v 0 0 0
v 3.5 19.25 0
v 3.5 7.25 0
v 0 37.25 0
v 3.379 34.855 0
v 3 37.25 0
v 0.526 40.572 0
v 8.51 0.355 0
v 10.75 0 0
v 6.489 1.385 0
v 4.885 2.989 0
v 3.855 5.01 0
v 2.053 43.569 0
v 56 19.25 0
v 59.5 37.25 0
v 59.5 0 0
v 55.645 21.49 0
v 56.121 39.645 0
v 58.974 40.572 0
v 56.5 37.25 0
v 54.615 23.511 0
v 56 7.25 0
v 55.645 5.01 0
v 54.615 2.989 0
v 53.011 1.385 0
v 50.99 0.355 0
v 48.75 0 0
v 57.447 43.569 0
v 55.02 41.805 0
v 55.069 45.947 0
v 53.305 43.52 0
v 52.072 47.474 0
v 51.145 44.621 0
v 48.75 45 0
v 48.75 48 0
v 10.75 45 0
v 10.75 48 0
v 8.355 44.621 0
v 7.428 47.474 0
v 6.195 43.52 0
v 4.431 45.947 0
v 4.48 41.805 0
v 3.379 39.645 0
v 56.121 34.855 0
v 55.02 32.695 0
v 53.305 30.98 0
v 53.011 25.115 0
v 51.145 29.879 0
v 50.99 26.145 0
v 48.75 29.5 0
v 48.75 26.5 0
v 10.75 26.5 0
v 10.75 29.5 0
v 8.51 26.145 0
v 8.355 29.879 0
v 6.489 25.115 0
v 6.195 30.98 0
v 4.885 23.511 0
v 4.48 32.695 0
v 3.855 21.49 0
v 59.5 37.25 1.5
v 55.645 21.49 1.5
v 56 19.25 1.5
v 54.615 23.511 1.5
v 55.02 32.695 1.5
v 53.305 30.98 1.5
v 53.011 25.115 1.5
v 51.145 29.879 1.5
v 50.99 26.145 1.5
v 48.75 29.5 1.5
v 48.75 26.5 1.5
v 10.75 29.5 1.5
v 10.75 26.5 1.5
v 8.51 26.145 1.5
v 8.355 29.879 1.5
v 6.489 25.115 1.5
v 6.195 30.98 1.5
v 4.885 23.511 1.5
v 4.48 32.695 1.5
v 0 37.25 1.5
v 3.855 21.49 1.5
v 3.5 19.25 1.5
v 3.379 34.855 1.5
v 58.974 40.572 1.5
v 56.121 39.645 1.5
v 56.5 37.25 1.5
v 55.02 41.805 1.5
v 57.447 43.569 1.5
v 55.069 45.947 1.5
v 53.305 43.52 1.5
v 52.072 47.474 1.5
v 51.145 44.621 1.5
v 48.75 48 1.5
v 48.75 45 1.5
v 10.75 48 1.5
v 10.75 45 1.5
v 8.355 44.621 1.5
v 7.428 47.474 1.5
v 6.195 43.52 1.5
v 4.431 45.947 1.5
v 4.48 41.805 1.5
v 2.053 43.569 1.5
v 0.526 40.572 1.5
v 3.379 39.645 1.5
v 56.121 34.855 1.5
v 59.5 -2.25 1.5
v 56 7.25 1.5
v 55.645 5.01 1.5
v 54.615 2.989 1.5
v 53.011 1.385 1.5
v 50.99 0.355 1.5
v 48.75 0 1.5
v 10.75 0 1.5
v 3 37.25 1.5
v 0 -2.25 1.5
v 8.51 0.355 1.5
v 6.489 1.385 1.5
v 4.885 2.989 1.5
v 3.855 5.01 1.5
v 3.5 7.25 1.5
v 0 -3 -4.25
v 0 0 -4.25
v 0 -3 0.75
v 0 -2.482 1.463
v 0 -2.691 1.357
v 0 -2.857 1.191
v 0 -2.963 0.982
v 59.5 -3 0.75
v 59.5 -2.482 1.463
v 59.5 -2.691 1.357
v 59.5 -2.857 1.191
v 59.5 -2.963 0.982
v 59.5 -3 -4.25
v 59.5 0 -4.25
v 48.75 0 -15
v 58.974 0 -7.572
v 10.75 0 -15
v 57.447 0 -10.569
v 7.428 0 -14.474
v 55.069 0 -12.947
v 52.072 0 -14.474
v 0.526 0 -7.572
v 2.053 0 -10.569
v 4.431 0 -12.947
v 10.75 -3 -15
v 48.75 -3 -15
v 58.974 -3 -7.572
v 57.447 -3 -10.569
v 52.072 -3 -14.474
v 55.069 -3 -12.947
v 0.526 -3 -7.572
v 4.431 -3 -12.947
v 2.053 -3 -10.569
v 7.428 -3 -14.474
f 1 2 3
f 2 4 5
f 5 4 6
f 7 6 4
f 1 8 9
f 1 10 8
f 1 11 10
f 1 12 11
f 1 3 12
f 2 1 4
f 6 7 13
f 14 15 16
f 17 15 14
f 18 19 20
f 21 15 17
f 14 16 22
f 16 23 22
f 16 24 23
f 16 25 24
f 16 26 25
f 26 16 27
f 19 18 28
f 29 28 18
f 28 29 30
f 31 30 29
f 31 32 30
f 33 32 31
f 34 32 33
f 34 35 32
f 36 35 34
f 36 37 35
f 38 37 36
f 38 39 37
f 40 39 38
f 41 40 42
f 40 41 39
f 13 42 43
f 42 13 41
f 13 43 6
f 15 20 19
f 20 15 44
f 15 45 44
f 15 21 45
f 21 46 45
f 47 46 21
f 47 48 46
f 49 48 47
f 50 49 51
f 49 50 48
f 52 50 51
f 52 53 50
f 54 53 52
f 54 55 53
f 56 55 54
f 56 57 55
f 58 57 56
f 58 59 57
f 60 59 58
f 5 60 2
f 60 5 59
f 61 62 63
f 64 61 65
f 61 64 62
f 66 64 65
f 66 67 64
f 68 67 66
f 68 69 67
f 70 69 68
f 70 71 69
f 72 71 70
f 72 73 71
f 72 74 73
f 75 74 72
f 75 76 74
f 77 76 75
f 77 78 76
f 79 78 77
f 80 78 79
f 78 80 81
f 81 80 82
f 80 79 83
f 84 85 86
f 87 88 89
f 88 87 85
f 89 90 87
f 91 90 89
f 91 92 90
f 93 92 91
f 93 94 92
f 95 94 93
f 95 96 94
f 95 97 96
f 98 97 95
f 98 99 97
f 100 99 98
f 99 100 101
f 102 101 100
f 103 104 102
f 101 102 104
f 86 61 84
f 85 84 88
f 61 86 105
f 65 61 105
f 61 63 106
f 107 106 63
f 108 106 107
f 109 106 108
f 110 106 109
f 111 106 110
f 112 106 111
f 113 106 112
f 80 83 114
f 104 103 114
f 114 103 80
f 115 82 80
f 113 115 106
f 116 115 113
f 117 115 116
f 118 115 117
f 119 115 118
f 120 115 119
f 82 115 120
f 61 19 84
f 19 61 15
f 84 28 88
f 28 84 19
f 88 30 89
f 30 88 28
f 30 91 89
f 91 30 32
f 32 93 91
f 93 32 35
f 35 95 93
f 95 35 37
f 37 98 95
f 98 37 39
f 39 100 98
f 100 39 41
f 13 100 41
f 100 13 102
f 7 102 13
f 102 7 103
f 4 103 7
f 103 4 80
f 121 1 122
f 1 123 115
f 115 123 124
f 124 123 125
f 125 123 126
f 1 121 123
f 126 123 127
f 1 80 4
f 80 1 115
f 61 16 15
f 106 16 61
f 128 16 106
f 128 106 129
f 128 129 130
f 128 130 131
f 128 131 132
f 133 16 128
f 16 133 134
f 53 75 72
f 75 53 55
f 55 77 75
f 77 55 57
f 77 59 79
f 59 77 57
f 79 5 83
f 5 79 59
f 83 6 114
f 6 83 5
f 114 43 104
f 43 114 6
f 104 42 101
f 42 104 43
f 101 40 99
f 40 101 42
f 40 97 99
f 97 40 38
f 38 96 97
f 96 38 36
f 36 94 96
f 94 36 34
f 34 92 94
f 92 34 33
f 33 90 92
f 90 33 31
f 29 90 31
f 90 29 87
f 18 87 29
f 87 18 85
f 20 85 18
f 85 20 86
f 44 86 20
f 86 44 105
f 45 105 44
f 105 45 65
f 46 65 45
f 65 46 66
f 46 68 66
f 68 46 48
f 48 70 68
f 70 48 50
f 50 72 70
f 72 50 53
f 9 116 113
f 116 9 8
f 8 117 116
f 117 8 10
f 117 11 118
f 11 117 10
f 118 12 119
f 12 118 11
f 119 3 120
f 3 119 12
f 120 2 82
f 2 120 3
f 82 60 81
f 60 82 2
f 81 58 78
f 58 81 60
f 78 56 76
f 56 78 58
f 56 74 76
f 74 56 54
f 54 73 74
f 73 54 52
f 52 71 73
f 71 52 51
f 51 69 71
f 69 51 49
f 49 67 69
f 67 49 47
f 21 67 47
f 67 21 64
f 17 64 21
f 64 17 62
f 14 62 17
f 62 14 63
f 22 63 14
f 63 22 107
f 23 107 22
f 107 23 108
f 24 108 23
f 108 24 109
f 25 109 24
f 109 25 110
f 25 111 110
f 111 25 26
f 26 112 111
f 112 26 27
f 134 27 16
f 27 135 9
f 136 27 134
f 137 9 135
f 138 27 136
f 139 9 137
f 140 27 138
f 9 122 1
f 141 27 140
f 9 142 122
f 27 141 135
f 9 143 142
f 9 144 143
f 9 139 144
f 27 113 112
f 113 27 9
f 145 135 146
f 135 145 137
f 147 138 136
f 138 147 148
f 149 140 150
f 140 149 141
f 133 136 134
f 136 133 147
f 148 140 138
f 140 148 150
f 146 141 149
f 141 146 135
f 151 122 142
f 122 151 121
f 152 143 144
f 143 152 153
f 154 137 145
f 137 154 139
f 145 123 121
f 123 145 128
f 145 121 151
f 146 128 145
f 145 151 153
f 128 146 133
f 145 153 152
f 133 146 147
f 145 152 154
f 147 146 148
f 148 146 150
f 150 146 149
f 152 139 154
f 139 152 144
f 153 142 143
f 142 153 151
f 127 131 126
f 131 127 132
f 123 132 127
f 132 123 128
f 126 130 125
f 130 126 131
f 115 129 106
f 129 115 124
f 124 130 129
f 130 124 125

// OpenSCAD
rbFtDims=[52.5,14.5,1.5];
rbFtSpcng=0.5;
shlfDist=30;
shlfThck=15;
wallThck=3;

$fn=20;
crnrRad=rbFtDims.y/2+wallThck+rbFtSpcng;
ovDims=[rbFtDims.x+wallThck*2+rbFtSpcng*2,rbFtDims.y+rbFtSpcng+shlfDist+wallThck,rbFtDims.z];
cutOutWdth=shlfDist-wallThck-rbFtSpcng;

linear_extrude(ovDims.z) difference(){
  translate([crnrRad,-wallThck+ovDims.z/2,0]) offset(crnrRad) square(ovDims+[-crnrRad*2,-crnrRad+wallThck-ovDims.z/2]);
  translate([0,-crnrRad-wallThck+ovDims.z/2]) square([ovDims.x,crnrRad]);
  translate([ovDims.x/2,shlfDist+rbFtDims.y/2]) 
    hull() for(ix=[-1,1])
      translate([ix*(rbFtDims.x-rbFtDims.y)/2,0]) circle(d=rbFtDims.y+rbFtSpcng*2);
  //cutout
  translate([ovDims.x/2,cutOutWdth/2]) 
    hull() for(ix=[-1,1],iy=[-1,1])
      translate([ix*(rbFtDims.x-rbFtDims.y)/2,iy*(cutOutWdth/2-rbFtDims.y/2)]) circle(d=rbFtDims.y);
}

translate([0,-wallThck,ovDims.z/2]) rotate([-90,0,0]) 
  translate([crnrRad,0,0]) linear_extrude(wallThck) difference(){
    offset(crnrRad) square([ovDims.x-crnrRad*2,shlfThck-crnrRad+ovDims.z/2]);
    translate([-crnrRad,-crnrRad]) square([ovDims.x,crnrRad]);
}

translate([0,-wallThck+ovDims.z/2,ovDims.z/2]) rotate([0,90,0]) cylinder(d=rbFtDims.z,h=ovDims.x);
